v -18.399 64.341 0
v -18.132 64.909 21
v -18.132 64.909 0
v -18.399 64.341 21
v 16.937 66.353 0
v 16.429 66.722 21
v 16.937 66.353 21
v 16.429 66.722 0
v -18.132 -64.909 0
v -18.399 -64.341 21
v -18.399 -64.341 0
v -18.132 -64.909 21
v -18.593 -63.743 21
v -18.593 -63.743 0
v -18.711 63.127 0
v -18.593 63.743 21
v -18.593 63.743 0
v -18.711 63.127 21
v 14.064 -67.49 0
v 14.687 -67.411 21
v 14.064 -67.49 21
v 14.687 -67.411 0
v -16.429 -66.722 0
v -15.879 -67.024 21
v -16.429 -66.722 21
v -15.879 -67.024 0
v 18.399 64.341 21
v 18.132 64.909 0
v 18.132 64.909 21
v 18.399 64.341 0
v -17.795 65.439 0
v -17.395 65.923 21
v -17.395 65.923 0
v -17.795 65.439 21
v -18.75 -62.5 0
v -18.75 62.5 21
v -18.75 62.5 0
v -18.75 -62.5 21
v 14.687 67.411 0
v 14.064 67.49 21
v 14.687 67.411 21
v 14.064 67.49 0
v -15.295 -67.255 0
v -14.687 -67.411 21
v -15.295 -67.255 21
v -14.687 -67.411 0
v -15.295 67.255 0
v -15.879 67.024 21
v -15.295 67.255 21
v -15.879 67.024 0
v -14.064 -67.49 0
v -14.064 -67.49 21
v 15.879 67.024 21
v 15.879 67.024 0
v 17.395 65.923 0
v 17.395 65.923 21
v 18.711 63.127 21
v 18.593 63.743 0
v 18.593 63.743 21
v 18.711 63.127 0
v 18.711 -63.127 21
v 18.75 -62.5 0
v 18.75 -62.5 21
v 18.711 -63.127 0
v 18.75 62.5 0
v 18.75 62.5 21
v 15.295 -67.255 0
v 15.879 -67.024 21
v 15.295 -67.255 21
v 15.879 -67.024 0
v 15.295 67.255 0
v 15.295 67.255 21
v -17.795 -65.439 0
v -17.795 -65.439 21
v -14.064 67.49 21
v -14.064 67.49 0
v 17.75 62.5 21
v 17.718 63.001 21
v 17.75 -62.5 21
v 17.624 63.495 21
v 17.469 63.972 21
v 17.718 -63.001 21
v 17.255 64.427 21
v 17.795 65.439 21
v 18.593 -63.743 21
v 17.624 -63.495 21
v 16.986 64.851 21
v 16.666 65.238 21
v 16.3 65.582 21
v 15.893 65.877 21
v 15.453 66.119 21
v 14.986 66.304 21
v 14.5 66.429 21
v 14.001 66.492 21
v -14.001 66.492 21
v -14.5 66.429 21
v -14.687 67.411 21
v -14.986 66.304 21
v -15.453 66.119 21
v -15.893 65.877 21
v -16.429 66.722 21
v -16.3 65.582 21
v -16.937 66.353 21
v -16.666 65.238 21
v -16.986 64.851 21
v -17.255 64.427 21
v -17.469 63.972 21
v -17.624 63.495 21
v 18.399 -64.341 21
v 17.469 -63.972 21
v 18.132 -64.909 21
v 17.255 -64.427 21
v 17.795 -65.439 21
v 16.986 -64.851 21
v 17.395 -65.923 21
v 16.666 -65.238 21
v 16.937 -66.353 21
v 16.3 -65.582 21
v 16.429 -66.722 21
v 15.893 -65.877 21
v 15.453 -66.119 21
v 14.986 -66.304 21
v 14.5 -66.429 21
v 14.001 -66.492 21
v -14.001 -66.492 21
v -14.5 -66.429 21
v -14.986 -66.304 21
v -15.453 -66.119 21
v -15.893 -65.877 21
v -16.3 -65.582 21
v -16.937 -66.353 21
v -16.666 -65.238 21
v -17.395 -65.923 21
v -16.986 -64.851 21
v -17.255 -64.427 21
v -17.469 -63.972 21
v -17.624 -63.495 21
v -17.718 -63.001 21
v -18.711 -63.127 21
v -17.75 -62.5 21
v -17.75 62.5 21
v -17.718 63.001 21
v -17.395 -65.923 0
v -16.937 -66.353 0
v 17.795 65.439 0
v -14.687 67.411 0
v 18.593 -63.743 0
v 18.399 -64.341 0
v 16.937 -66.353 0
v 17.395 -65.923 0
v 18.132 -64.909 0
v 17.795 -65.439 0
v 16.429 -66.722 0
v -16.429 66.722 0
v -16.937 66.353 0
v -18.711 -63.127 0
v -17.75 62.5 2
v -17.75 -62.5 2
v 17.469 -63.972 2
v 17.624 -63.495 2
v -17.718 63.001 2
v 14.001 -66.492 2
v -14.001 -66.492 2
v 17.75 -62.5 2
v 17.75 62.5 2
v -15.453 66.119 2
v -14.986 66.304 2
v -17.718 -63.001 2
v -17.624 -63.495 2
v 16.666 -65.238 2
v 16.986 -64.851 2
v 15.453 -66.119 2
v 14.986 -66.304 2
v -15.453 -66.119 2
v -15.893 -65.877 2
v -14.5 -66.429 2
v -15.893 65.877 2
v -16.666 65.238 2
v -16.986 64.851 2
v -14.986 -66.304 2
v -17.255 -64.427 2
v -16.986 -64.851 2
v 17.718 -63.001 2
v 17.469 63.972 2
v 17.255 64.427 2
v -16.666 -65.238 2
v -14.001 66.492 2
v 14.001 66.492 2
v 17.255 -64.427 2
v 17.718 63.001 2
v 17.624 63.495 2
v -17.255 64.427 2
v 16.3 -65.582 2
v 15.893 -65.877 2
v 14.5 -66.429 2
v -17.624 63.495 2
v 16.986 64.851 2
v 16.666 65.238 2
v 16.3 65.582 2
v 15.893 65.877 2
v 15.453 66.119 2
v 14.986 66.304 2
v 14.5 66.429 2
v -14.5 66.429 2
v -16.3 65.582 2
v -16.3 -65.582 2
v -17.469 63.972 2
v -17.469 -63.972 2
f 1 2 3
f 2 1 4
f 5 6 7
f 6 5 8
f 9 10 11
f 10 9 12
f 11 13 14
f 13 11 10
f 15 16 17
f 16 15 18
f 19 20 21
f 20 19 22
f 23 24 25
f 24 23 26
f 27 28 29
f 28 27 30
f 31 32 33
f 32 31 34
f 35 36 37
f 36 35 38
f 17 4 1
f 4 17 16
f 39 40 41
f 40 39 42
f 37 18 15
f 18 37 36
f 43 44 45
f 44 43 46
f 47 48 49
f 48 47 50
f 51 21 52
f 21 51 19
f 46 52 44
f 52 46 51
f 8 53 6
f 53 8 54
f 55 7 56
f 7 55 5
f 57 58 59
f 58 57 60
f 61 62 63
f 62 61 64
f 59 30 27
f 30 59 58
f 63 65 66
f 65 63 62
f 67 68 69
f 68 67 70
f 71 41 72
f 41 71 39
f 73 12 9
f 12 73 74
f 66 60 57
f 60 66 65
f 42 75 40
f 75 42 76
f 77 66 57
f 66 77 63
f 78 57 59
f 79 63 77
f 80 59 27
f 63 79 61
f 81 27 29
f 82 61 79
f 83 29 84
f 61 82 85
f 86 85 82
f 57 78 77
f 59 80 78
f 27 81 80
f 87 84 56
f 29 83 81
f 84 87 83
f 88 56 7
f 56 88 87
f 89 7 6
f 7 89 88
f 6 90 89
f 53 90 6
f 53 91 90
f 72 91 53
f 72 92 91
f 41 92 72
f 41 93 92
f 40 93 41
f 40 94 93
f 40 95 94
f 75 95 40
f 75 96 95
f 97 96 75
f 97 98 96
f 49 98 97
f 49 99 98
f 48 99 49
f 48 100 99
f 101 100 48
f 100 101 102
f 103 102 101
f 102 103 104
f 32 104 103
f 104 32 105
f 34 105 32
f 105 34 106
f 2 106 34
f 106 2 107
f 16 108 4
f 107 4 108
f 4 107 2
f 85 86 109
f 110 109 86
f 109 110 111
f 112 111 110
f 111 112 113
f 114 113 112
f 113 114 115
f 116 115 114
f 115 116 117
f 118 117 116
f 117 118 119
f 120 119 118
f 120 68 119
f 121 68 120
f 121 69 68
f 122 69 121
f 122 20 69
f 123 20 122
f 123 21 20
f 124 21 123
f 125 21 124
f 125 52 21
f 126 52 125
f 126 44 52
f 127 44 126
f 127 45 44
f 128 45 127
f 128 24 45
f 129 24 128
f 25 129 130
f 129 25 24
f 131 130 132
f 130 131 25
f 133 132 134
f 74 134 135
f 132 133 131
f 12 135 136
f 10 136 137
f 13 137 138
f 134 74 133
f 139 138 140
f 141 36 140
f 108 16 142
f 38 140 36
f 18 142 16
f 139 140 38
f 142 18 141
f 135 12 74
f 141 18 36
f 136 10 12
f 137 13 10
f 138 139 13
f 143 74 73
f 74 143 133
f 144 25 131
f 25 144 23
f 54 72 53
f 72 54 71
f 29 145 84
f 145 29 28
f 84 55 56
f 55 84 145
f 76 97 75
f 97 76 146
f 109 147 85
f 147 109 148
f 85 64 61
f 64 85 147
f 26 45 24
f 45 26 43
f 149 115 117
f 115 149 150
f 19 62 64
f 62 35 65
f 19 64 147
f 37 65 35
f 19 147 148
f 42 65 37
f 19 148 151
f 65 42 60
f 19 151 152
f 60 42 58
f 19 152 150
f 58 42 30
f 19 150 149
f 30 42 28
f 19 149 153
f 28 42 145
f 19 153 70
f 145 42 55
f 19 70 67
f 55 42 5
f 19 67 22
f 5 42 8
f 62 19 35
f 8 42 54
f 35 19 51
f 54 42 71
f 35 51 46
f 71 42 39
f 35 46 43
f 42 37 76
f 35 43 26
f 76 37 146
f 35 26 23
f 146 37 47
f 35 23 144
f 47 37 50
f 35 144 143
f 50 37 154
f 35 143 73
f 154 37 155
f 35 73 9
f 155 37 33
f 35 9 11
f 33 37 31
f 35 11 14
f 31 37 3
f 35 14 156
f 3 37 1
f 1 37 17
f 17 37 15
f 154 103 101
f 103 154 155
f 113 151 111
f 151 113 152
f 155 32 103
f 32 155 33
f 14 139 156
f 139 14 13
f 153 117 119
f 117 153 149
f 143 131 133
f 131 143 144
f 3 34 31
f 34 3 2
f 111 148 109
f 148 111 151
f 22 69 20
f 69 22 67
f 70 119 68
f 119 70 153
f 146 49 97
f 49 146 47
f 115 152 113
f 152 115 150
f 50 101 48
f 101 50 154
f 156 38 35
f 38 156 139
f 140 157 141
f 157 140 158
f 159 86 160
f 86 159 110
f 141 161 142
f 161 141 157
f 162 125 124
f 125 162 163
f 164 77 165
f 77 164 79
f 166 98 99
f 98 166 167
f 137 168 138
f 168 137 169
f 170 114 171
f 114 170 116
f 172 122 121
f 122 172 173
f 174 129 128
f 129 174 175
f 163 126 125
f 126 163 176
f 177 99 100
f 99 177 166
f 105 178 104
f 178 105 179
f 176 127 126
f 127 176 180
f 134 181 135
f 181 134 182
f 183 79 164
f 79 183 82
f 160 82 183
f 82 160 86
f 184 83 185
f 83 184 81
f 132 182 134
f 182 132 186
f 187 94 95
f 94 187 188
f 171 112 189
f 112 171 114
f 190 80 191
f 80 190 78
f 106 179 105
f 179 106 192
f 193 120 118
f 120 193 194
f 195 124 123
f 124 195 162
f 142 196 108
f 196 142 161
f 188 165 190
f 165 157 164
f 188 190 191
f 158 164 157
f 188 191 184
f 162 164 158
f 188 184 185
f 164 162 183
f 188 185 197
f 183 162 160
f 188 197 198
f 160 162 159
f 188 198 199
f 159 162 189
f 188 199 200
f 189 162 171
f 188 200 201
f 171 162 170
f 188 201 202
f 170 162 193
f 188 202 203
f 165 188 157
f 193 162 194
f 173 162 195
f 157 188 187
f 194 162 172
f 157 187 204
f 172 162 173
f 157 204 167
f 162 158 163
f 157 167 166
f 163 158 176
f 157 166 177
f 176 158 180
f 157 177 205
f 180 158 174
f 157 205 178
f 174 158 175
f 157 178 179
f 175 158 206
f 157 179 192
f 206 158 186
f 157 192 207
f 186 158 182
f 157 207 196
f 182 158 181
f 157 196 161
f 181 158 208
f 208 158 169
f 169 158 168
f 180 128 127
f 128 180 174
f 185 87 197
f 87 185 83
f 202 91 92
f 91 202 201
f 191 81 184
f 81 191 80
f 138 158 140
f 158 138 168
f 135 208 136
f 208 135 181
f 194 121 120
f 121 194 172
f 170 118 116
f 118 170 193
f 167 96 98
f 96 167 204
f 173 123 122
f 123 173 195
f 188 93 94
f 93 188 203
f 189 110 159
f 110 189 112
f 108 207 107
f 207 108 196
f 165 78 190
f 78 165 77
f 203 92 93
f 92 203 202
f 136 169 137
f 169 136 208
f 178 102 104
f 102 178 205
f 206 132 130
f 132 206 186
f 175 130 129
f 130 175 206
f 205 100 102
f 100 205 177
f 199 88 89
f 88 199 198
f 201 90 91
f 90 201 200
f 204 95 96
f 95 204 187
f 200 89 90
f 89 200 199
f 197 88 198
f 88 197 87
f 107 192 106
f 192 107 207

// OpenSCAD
$fn = 50;


difference() {
	union() {
		hull() {
			translate(v = [-13.7500000000, 62.5000000000, 0]) {
				cylinder(h = 21, r = 5);
			}
			translate(v = [13.7500000000, 62.5000000000, 0]) {
				cylinder(h = 21, r = 5);
			}
			translate(v = [-13.7500000000, -62.5000000000, 0]) {
				cylinder(h = 21, r = 5);
			}
			translate(v = [13.7500000000, -62.5000000000, 0]) {
				cylinder(h = 21, r = 5);
			}
		}
	}
	union() {
		translate(v = [0, 0, 2]) {
			hull() {
				translate(v = [-13.7500000000, 62.5000000000, 0]) {
					cylinder(h = 19, r = 4);
				}
				translate(v = [13.7500000000, 62.5000000000, 0]) {
					cylinder(h = 19, r = 4);
				}
				translate(v = [-13.7500000000, -62.5000000000, 0]) {
					cylinder(h = 19, r = 4);
				}
				translate(v = [13.7500000000, -62.5000000000, 0]) {
					cylinder(h = 19, r = 4);
				}
			}
		}
	}
}
